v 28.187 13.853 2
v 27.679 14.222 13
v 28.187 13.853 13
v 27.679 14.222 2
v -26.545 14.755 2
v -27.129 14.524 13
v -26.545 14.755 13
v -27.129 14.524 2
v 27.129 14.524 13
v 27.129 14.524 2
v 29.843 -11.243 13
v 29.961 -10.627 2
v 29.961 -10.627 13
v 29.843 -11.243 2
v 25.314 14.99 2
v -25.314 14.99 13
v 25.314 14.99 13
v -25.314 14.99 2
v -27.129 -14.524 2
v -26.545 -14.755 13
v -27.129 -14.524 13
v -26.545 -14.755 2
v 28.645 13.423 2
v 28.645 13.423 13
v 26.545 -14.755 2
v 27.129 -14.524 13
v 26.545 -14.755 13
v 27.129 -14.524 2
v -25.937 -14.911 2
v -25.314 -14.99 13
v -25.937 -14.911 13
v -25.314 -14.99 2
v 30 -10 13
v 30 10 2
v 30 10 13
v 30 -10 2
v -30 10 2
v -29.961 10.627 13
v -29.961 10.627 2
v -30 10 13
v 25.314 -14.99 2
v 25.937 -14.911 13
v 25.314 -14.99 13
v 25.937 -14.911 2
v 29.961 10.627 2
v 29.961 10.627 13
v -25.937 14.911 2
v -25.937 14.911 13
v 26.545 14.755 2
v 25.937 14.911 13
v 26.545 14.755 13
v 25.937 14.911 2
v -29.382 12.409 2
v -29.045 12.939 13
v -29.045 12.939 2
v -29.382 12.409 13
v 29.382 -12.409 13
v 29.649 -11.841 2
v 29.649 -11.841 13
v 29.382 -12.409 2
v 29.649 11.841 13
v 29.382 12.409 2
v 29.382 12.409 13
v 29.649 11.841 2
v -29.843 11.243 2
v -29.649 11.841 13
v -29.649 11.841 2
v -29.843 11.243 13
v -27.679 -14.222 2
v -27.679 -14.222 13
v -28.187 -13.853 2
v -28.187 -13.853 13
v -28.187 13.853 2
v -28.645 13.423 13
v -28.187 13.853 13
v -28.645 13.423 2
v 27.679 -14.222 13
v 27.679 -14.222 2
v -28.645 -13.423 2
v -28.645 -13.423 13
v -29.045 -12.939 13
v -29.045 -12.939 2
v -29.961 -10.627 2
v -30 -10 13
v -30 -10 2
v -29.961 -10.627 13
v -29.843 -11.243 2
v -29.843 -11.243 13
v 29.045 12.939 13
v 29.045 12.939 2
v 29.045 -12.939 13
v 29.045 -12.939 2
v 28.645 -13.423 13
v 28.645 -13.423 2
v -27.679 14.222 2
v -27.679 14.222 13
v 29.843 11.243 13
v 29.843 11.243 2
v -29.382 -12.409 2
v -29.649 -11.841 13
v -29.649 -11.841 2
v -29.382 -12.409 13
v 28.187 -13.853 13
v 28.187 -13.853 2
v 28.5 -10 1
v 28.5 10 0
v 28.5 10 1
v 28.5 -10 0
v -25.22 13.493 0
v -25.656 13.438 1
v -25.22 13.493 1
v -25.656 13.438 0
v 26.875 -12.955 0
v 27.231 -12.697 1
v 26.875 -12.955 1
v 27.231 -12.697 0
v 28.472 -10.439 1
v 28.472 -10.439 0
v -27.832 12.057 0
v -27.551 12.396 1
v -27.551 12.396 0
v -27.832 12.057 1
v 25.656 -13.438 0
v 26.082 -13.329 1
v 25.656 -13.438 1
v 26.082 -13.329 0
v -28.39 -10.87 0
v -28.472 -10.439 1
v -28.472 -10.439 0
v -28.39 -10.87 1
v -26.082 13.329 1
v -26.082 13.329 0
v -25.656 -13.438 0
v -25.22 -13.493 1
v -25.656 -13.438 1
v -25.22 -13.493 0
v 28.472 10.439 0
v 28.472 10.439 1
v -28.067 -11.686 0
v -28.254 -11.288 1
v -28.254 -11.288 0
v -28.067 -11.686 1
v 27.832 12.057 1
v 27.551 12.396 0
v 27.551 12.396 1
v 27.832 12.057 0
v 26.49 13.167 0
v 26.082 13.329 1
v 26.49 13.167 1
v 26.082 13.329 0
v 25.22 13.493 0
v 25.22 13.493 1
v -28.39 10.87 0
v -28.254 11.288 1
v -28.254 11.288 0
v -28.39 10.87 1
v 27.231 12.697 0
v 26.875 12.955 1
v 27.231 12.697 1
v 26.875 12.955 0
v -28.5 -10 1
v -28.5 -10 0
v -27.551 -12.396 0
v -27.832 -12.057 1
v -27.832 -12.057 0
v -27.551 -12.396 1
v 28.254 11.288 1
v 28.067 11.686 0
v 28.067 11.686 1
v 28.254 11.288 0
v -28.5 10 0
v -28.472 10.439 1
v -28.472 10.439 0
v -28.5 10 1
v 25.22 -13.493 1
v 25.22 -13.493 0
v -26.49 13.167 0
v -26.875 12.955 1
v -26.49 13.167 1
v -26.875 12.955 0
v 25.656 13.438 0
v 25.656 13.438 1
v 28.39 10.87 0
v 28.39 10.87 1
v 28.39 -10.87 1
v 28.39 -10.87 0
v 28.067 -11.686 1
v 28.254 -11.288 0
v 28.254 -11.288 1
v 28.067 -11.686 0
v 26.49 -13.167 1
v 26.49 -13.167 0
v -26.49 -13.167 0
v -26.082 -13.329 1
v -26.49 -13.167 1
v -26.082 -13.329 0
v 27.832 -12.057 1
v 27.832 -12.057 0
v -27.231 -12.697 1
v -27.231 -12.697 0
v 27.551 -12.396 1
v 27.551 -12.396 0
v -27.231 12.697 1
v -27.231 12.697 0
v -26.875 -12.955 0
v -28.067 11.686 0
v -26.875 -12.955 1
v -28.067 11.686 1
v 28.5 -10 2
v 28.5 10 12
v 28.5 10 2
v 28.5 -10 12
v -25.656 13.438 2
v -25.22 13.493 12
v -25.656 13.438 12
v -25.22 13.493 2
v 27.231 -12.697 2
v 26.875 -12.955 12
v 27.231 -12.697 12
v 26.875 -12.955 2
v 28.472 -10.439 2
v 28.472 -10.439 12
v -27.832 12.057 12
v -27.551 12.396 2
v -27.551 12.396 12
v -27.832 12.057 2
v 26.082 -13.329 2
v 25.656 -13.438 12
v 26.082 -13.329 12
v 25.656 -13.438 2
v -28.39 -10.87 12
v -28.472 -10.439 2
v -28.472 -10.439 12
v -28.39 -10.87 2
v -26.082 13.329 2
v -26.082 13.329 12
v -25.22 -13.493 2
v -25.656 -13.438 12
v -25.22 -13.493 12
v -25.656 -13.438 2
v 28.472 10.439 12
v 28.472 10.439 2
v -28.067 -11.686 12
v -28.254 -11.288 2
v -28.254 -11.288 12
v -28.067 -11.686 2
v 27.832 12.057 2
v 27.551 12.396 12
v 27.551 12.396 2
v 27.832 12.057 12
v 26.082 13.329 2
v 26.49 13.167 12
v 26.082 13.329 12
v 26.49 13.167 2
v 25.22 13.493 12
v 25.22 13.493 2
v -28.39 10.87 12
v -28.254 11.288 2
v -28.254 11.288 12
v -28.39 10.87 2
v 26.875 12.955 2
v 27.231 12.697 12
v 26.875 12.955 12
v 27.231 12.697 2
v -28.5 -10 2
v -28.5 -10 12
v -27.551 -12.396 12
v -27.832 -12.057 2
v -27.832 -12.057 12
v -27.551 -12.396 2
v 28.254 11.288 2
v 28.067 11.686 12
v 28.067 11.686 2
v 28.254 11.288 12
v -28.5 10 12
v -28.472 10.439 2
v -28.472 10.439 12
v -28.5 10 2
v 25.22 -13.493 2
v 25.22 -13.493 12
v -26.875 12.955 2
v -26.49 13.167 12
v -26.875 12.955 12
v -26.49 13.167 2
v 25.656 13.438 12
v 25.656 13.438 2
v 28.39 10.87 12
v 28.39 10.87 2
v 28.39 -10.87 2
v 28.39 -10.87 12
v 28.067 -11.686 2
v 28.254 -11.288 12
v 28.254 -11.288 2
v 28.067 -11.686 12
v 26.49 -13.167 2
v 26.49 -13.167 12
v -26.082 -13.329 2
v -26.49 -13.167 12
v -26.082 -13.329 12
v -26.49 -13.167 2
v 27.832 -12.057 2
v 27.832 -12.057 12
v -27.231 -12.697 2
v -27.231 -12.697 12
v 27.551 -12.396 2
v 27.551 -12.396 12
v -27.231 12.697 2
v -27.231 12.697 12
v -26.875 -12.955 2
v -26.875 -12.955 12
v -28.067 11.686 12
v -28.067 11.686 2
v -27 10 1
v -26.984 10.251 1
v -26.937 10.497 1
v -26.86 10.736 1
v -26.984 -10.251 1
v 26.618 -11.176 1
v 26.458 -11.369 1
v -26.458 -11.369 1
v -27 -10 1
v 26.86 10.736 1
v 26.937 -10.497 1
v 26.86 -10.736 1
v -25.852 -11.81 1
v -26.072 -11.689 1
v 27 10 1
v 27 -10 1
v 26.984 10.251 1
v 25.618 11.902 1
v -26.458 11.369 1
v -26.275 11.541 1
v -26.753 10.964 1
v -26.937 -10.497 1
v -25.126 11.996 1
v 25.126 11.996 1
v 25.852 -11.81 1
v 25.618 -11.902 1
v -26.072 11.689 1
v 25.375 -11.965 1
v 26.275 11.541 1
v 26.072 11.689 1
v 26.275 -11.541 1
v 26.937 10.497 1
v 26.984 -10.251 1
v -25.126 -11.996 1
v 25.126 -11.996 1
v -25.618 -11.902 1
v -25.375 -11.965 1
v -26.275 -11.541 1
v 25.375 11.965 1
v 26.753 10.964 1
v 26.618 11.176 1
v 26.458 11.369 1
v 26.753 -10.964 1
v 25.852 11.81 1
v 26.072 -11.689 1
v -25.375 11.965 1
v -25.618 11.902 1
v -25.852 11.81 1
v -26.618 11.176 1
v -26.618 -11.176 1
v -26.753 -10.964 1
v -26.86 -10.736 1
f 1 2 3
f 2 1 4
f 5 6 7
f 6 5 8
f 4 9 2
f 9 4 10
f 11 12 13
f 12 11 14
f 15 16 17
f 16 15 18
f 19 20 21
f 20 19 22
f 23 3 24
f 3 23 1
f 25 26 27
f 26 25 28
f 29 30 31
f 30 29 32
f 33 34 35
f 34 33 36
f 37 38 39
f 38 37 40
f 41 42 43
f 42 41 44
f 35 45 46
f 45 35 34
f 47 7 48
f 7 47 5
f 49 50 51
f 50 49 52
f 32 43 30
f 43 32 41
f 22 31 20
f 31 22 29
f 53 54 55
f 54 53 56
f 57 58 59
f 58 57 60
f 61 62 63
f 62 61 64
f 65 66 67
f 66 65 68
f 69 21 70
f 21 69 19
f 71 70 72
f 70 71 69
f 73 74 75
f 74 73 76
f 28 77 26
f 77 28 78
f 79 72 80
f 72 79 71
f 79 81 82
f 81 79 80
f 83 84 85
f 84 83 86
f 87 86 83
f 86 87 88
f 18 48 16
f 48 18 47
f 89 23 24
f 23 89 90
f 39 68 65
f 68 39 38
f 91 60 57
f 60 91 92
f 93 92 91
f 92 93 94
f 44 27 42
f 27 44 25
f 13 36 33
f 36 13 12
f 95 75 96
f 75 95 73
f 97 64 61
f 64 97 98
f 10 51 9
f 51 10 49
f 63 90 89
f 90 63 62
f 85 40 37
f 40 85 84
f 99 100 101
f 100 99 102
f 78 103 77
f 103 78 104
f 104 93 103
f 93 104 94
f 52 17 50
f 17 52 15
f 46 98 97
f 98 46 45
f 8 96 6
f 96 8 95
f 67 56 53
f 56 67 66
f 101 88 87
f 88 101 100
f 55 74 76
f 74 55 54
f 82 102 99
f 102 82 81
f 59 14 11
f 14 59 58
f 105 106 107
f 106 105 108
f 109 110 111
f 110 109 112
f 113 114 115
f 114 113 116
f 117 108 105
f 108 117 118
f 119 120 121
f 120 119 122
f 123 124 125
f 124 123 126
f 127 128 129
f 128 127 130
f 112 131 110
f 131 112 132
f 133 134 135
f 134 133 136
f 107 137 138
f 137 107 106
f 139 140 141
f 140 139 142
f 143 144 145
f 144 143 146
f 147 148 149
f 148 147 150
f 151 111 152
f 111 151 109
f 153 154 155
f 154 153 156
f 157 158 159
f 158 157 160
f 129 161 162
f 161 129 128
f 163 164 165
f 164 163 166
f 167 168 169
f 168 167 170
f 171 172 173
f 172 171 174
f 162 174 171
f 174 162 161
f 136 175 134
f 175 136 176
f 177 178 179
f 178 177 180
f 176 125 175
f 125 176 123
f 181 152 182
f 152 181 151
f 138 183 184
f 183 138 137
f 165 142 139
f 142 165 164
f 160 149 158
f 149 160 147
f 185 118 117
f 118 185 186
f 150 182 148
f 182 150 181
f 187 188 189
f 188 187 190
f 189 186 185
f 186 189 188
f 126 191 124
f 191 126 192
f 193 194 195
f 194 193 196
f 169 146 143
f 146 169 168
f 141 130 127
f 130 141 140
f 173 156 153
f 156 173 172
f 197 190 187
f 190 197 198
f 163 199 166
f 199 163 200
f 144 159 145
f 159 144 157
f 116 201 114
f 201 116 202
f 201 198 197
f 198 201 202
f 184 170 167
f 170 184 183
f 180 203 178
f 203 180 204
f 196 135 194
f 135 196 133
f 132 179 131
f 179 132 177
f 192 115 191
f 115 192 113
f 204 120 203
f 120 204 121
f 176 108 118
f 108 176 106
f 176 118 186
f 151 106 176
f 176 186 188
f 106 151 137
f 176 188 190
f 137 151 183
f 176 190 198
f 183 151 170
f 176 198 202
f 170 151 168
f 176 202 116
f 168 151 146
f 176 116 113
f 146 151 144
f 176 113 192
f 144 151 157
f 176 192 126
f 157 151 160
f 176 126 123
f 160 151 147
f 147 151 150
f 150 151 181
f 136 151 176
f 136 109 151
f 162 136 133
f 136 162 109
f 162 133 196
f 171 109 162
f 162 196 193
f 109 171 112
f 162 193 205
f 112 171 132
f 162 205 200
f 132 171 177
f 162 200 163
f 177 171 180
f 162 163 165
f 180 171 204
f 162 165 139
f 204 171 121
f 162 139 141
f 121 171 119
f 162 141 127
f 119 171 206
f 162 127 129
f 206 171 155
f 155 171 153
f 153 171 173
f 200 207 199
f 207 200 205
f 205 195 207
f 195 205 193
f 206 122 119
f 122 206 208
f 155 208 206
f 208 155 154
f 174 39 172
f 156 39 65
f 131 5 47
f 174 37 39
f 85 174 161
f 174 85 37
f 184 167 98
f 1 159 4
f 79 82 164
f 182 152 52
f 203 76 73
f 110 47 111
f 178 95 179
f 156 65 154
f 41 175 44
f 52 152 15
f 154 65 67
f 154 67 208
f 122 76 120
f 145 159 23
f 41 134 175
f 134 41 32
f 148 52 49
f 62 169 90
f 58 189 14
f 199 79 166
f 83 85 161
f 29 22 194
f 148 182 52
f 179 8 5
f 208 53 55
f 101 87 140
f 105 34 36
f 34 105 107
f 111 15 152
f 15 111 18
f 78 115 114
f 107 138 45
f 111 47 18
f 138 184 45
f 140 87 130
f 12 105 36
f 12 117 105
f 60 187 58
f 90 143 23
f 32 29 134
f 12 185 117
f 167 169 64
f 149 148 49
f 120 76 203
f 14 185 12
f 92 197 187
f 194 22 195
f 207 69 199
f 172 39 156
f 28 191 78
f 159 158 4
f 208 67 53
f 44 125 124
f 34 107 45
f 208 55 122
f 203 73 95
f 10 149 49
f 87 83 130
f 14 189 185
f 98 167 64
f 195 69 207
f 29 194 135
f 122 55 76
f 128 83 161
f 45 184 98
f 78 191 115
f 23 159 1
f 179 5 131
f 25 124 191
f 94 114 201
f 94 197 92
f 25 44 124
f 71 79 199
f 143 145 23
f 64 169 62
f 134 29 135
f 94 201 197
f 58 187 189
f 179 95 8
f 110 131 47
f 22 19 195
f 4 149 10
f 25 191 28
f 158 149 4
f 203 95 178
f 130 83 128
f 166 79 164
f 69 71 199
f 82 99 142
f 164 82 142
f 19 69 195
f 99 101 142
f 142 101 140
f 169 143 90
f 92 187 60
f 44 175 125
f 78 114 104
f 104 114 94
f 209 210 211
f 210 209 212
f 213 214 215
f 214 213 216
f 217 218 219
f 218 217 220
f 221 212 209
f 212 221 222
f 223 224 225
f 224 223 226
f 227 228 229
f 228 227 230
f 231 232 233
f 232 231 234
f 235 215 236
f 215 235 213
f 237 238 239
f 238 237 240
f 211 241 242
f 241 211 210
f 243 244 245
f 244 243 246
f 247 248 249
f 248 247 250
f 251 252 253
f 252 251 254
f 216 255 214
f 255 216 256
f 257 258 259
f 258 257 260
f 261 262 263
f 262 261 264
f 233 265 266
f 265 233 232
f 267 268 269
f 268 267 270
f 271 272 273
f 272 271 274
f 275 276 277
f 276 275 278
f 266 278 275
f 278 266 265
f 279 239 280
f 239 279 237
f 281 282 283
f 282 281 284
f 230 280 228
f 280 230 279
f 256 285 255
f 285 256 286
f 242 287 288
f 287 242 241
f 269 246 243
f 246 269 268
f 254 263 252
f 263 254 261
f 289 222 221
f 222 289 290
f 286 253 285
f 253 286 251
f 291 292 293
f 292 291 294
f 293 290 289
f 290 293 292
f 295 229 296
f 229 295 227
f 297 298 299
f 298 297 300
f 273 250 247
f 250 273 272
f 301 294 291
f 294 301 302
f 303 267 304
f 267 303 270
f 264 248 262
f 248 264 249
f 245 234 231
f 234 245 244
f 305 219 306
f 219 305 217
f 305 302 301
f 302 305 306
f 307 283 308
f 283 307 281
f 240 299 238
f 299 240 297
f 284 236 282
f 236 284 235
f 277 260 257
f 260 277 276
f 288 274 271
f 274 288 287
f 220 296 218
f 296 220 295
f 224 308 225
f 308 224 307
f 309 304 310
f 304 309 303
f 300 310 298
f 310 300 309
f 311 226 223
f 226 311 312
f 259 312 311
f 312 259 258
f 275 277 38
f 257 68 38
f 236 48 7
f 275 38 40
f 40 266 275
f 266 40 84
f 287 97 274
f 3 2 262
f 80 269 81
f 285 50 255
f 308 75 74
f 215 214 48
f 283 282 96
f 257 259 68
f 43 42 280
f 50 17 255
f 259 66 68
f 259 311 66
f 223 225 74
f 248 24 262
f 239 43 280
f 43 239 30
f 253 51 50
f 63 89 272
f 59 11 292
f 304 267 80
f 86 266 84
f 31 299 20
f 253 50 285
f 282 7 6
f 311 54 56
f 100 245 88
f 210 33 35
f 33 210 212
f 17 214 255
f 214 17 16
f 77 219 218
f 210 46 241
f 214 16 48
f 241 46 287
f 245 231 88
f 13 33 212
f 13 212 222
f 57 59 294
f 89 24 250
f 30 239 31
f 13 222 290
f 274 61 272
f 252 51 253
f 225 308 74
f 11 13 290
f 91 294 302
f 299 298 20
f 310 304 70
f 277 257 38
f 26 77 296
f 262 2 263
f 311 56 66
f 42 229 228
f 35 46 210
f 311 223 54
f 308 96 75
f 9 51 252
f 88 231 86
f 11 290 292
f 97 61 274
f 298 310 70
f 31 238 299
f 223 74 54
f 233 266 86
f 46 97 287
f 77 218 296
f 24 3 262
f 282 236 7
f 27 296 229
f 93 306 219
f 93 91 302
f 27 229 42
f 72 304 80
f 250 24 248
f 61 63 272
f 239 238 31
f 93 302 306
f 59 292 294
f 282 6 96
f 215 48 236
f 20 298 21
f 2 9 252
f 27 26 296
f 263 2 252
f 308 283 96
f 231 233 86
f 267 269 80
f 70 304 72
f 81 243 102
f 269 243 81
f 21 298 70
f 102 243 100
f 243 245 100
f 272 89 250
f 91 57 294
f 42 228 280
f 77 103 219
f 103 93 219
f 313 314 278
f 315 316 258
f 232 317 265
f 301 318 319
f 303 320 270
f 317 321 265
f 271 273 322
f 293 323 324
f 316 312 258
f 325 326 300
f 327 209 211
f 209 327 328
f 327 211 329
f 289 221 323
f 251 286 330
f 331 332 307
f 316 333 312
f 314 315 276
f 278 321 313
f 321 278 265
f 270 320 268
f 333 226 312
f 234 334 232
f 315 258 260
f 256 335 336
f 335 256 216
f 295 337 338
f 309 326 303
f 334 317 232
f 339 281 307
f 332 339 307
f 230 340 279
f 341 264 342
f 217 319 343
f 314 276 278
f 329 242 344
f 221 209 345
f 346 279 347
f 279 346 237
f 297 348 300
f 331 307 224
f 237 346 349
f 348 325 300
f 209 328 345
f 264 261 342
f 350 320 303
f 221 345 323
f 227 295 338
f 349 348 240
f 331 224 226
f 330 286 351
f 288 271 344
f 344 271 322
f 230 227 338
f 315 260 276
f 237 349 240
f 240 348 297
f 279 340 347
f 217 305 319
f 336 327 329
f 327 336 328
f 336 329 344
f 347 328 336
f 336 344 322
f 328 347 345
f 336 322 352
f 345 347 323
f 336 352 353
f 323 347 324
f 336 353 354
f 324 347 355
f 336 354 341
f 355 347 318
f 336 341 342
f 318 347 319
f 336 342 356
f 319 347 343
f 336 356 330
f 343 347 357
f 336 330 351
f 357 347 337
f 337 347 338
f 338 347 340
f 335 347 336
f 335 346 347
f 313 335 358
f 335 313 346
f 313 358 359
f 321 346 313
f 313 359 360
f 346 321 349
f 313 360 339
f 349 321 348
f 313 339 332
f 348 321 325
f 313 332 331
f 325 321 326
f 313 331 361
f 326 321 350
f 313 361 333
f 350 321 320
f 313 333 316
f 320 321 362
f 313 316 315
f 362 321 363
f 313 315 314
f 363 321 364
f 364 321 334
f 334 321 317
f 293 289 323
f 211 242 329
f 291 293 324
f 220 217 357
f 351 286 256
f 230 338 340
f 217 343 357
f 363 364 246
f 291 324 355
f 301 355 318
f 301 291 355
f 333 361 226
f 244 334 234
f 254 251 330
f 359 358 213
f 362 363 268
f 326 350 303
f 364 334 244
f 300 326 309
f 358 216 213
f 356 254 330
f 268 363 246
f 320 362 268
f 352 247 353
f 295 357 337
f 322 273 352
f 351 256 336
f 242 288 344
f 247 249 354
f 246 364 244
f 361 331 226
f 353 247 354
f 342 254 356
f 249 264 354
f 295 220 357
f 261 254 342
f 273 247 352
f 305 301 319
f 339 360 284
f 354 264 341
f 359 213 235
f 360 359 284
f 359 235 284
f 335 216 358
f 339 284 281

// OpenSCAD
$fn = 50;


difference() {
	union() {
		translate(v = [0, 0, 2]) {
			hull() {
				translate(v = [-25.0000000000, 10.0000000000, 0]) {
					cylinder(h = 11, r = 5);
				}
				translate(v = [25.0000000000, 10.0000000000, 0]) {
					cylinder(h = 11, r = 5);
				}
				translate(v = [-25.0000000000, -10.0000000000, 0]) {
					cylinder(h = 11, r = 5);
				}
				translate(v = [25.0000000000, -10.0000000000, 0]) {
					cylinder(h = 11, r = 5);
				}
			}
		}
		hull() {
			translate(v = [-25.0000000000, 10.0000000000, 0]) {
				cylinder(h = 1, r = 3.5000000000);
			}
			translate(v = [25.0000000000, 10.0000000000, 0]) {
				cylinder(h = 1, r = 3.5000000000);
			}
			translate(v = [-25.0000000000, -10.0000000000, 0]) {
				cylinder(h = 1, r = 3.5000000000);
			}
			translate(v = [25.0000000000, -10.0000000000, 0]) {
				cylinder(h = 1, r = 3.5000000000);
			}
		}
		translate(v = [0, 0, 1]) {
			hull() {
				translate(v = [-25.0000000000, 10.0000000000, 0]) {
					cylinder(h = 1, r1 = 3.5000000000, r2 = 5.0000000000);
				}
				translate(v = [25.0000000000, 10.0000000000, 0]) {
					cylinder(h = 1, r1 = 3.5000000000, r2 = 5.0000000000);
				}
				translate(v = [-25.0000000000, -10.0000000000, 0]) {
					cylinder(h = 1, r1 = 3.5000000000, r2 = 5.0000000000);
				}
				translate(v = [25.0000000000, -10.0000000000, 0]) {
					cylinder(h = 1, r1 = 3.5000000000, r2 = 5.0000000000);
				}
			}
		}
	}
	union() {
		translate(v = [0, 0, 2]) {
			#hull() {
				translate(v = [-25.0000000000, 10.0000000000, 0]) {
					cylinder(h = 11, r = 3.5000000000);
				}
				translate(v = [25.0000000000, 10.0000000000, 0]) {
					cylinder(h = 11, r = 3.5000000000);
				}
				translate(v = [-25.0000000000, -10.0000000000, 0]) {
					cylinder(h = 11, r = 3.5000000000);
				}
				translate(v = [25.0000000000, -10.0000000000, 0]) {
					cylinder(h = 11, r = 3.5000000000);
				}
			}
		}
		translate(v = [0, 0, 12]) {
			hull() {
				translate(v = [-25.0000000000, 10.0000000000, 0]) {
					cylinder(h = 1, r1 = 3.5000000000, r2 = 5.0000000000);
				}
				translate(v = [25.0000000000, 10.0000000000, 0]) {
					cylinder(h = 1, r1 = 3.5000000000, r2 = 5.0000000000);
				}
				translate(v = [-25.0000000000, -10.0000000000, 0]) {
					cylinder(h = 1, r1 = 3.5000000000, r2 = 5.0000000000);
				}
				translate(v = [25.0000000000, -10.0000000000, 0]) {
					cylinder(h = 1, r1 = 3.5000000000, r2 = 5.0000000000);
				}
			}
		}
		translate(v = [0, 0, 1]) {
			#hull() {
				translate(v = [-25.0000000000, 10.0000000000, 0]) {
					cylinder(h = 1, r1 = 2.0000000000, r2 = 3.5000000000);
				}
				translate(v = [25.0000000000, 10.0000000000, 0]) {
					cylinder(h = 1, r1 = 2.0000000000, r2 = 3.5000000000);
				}
				translate(v = [-25.0000000000, -10.0000000000, 0]) {
					cylinder(h = 1, r1 = 2.0000000000, r2 = 3.5000000000);
				}
				translate(v = [25.0000000000, -10.0000000000, 0]) {
					cylinder(h = 1, r1 = 2.0000000000, r2 = 3.5000000000);
				}
			}
		}
	}
}
